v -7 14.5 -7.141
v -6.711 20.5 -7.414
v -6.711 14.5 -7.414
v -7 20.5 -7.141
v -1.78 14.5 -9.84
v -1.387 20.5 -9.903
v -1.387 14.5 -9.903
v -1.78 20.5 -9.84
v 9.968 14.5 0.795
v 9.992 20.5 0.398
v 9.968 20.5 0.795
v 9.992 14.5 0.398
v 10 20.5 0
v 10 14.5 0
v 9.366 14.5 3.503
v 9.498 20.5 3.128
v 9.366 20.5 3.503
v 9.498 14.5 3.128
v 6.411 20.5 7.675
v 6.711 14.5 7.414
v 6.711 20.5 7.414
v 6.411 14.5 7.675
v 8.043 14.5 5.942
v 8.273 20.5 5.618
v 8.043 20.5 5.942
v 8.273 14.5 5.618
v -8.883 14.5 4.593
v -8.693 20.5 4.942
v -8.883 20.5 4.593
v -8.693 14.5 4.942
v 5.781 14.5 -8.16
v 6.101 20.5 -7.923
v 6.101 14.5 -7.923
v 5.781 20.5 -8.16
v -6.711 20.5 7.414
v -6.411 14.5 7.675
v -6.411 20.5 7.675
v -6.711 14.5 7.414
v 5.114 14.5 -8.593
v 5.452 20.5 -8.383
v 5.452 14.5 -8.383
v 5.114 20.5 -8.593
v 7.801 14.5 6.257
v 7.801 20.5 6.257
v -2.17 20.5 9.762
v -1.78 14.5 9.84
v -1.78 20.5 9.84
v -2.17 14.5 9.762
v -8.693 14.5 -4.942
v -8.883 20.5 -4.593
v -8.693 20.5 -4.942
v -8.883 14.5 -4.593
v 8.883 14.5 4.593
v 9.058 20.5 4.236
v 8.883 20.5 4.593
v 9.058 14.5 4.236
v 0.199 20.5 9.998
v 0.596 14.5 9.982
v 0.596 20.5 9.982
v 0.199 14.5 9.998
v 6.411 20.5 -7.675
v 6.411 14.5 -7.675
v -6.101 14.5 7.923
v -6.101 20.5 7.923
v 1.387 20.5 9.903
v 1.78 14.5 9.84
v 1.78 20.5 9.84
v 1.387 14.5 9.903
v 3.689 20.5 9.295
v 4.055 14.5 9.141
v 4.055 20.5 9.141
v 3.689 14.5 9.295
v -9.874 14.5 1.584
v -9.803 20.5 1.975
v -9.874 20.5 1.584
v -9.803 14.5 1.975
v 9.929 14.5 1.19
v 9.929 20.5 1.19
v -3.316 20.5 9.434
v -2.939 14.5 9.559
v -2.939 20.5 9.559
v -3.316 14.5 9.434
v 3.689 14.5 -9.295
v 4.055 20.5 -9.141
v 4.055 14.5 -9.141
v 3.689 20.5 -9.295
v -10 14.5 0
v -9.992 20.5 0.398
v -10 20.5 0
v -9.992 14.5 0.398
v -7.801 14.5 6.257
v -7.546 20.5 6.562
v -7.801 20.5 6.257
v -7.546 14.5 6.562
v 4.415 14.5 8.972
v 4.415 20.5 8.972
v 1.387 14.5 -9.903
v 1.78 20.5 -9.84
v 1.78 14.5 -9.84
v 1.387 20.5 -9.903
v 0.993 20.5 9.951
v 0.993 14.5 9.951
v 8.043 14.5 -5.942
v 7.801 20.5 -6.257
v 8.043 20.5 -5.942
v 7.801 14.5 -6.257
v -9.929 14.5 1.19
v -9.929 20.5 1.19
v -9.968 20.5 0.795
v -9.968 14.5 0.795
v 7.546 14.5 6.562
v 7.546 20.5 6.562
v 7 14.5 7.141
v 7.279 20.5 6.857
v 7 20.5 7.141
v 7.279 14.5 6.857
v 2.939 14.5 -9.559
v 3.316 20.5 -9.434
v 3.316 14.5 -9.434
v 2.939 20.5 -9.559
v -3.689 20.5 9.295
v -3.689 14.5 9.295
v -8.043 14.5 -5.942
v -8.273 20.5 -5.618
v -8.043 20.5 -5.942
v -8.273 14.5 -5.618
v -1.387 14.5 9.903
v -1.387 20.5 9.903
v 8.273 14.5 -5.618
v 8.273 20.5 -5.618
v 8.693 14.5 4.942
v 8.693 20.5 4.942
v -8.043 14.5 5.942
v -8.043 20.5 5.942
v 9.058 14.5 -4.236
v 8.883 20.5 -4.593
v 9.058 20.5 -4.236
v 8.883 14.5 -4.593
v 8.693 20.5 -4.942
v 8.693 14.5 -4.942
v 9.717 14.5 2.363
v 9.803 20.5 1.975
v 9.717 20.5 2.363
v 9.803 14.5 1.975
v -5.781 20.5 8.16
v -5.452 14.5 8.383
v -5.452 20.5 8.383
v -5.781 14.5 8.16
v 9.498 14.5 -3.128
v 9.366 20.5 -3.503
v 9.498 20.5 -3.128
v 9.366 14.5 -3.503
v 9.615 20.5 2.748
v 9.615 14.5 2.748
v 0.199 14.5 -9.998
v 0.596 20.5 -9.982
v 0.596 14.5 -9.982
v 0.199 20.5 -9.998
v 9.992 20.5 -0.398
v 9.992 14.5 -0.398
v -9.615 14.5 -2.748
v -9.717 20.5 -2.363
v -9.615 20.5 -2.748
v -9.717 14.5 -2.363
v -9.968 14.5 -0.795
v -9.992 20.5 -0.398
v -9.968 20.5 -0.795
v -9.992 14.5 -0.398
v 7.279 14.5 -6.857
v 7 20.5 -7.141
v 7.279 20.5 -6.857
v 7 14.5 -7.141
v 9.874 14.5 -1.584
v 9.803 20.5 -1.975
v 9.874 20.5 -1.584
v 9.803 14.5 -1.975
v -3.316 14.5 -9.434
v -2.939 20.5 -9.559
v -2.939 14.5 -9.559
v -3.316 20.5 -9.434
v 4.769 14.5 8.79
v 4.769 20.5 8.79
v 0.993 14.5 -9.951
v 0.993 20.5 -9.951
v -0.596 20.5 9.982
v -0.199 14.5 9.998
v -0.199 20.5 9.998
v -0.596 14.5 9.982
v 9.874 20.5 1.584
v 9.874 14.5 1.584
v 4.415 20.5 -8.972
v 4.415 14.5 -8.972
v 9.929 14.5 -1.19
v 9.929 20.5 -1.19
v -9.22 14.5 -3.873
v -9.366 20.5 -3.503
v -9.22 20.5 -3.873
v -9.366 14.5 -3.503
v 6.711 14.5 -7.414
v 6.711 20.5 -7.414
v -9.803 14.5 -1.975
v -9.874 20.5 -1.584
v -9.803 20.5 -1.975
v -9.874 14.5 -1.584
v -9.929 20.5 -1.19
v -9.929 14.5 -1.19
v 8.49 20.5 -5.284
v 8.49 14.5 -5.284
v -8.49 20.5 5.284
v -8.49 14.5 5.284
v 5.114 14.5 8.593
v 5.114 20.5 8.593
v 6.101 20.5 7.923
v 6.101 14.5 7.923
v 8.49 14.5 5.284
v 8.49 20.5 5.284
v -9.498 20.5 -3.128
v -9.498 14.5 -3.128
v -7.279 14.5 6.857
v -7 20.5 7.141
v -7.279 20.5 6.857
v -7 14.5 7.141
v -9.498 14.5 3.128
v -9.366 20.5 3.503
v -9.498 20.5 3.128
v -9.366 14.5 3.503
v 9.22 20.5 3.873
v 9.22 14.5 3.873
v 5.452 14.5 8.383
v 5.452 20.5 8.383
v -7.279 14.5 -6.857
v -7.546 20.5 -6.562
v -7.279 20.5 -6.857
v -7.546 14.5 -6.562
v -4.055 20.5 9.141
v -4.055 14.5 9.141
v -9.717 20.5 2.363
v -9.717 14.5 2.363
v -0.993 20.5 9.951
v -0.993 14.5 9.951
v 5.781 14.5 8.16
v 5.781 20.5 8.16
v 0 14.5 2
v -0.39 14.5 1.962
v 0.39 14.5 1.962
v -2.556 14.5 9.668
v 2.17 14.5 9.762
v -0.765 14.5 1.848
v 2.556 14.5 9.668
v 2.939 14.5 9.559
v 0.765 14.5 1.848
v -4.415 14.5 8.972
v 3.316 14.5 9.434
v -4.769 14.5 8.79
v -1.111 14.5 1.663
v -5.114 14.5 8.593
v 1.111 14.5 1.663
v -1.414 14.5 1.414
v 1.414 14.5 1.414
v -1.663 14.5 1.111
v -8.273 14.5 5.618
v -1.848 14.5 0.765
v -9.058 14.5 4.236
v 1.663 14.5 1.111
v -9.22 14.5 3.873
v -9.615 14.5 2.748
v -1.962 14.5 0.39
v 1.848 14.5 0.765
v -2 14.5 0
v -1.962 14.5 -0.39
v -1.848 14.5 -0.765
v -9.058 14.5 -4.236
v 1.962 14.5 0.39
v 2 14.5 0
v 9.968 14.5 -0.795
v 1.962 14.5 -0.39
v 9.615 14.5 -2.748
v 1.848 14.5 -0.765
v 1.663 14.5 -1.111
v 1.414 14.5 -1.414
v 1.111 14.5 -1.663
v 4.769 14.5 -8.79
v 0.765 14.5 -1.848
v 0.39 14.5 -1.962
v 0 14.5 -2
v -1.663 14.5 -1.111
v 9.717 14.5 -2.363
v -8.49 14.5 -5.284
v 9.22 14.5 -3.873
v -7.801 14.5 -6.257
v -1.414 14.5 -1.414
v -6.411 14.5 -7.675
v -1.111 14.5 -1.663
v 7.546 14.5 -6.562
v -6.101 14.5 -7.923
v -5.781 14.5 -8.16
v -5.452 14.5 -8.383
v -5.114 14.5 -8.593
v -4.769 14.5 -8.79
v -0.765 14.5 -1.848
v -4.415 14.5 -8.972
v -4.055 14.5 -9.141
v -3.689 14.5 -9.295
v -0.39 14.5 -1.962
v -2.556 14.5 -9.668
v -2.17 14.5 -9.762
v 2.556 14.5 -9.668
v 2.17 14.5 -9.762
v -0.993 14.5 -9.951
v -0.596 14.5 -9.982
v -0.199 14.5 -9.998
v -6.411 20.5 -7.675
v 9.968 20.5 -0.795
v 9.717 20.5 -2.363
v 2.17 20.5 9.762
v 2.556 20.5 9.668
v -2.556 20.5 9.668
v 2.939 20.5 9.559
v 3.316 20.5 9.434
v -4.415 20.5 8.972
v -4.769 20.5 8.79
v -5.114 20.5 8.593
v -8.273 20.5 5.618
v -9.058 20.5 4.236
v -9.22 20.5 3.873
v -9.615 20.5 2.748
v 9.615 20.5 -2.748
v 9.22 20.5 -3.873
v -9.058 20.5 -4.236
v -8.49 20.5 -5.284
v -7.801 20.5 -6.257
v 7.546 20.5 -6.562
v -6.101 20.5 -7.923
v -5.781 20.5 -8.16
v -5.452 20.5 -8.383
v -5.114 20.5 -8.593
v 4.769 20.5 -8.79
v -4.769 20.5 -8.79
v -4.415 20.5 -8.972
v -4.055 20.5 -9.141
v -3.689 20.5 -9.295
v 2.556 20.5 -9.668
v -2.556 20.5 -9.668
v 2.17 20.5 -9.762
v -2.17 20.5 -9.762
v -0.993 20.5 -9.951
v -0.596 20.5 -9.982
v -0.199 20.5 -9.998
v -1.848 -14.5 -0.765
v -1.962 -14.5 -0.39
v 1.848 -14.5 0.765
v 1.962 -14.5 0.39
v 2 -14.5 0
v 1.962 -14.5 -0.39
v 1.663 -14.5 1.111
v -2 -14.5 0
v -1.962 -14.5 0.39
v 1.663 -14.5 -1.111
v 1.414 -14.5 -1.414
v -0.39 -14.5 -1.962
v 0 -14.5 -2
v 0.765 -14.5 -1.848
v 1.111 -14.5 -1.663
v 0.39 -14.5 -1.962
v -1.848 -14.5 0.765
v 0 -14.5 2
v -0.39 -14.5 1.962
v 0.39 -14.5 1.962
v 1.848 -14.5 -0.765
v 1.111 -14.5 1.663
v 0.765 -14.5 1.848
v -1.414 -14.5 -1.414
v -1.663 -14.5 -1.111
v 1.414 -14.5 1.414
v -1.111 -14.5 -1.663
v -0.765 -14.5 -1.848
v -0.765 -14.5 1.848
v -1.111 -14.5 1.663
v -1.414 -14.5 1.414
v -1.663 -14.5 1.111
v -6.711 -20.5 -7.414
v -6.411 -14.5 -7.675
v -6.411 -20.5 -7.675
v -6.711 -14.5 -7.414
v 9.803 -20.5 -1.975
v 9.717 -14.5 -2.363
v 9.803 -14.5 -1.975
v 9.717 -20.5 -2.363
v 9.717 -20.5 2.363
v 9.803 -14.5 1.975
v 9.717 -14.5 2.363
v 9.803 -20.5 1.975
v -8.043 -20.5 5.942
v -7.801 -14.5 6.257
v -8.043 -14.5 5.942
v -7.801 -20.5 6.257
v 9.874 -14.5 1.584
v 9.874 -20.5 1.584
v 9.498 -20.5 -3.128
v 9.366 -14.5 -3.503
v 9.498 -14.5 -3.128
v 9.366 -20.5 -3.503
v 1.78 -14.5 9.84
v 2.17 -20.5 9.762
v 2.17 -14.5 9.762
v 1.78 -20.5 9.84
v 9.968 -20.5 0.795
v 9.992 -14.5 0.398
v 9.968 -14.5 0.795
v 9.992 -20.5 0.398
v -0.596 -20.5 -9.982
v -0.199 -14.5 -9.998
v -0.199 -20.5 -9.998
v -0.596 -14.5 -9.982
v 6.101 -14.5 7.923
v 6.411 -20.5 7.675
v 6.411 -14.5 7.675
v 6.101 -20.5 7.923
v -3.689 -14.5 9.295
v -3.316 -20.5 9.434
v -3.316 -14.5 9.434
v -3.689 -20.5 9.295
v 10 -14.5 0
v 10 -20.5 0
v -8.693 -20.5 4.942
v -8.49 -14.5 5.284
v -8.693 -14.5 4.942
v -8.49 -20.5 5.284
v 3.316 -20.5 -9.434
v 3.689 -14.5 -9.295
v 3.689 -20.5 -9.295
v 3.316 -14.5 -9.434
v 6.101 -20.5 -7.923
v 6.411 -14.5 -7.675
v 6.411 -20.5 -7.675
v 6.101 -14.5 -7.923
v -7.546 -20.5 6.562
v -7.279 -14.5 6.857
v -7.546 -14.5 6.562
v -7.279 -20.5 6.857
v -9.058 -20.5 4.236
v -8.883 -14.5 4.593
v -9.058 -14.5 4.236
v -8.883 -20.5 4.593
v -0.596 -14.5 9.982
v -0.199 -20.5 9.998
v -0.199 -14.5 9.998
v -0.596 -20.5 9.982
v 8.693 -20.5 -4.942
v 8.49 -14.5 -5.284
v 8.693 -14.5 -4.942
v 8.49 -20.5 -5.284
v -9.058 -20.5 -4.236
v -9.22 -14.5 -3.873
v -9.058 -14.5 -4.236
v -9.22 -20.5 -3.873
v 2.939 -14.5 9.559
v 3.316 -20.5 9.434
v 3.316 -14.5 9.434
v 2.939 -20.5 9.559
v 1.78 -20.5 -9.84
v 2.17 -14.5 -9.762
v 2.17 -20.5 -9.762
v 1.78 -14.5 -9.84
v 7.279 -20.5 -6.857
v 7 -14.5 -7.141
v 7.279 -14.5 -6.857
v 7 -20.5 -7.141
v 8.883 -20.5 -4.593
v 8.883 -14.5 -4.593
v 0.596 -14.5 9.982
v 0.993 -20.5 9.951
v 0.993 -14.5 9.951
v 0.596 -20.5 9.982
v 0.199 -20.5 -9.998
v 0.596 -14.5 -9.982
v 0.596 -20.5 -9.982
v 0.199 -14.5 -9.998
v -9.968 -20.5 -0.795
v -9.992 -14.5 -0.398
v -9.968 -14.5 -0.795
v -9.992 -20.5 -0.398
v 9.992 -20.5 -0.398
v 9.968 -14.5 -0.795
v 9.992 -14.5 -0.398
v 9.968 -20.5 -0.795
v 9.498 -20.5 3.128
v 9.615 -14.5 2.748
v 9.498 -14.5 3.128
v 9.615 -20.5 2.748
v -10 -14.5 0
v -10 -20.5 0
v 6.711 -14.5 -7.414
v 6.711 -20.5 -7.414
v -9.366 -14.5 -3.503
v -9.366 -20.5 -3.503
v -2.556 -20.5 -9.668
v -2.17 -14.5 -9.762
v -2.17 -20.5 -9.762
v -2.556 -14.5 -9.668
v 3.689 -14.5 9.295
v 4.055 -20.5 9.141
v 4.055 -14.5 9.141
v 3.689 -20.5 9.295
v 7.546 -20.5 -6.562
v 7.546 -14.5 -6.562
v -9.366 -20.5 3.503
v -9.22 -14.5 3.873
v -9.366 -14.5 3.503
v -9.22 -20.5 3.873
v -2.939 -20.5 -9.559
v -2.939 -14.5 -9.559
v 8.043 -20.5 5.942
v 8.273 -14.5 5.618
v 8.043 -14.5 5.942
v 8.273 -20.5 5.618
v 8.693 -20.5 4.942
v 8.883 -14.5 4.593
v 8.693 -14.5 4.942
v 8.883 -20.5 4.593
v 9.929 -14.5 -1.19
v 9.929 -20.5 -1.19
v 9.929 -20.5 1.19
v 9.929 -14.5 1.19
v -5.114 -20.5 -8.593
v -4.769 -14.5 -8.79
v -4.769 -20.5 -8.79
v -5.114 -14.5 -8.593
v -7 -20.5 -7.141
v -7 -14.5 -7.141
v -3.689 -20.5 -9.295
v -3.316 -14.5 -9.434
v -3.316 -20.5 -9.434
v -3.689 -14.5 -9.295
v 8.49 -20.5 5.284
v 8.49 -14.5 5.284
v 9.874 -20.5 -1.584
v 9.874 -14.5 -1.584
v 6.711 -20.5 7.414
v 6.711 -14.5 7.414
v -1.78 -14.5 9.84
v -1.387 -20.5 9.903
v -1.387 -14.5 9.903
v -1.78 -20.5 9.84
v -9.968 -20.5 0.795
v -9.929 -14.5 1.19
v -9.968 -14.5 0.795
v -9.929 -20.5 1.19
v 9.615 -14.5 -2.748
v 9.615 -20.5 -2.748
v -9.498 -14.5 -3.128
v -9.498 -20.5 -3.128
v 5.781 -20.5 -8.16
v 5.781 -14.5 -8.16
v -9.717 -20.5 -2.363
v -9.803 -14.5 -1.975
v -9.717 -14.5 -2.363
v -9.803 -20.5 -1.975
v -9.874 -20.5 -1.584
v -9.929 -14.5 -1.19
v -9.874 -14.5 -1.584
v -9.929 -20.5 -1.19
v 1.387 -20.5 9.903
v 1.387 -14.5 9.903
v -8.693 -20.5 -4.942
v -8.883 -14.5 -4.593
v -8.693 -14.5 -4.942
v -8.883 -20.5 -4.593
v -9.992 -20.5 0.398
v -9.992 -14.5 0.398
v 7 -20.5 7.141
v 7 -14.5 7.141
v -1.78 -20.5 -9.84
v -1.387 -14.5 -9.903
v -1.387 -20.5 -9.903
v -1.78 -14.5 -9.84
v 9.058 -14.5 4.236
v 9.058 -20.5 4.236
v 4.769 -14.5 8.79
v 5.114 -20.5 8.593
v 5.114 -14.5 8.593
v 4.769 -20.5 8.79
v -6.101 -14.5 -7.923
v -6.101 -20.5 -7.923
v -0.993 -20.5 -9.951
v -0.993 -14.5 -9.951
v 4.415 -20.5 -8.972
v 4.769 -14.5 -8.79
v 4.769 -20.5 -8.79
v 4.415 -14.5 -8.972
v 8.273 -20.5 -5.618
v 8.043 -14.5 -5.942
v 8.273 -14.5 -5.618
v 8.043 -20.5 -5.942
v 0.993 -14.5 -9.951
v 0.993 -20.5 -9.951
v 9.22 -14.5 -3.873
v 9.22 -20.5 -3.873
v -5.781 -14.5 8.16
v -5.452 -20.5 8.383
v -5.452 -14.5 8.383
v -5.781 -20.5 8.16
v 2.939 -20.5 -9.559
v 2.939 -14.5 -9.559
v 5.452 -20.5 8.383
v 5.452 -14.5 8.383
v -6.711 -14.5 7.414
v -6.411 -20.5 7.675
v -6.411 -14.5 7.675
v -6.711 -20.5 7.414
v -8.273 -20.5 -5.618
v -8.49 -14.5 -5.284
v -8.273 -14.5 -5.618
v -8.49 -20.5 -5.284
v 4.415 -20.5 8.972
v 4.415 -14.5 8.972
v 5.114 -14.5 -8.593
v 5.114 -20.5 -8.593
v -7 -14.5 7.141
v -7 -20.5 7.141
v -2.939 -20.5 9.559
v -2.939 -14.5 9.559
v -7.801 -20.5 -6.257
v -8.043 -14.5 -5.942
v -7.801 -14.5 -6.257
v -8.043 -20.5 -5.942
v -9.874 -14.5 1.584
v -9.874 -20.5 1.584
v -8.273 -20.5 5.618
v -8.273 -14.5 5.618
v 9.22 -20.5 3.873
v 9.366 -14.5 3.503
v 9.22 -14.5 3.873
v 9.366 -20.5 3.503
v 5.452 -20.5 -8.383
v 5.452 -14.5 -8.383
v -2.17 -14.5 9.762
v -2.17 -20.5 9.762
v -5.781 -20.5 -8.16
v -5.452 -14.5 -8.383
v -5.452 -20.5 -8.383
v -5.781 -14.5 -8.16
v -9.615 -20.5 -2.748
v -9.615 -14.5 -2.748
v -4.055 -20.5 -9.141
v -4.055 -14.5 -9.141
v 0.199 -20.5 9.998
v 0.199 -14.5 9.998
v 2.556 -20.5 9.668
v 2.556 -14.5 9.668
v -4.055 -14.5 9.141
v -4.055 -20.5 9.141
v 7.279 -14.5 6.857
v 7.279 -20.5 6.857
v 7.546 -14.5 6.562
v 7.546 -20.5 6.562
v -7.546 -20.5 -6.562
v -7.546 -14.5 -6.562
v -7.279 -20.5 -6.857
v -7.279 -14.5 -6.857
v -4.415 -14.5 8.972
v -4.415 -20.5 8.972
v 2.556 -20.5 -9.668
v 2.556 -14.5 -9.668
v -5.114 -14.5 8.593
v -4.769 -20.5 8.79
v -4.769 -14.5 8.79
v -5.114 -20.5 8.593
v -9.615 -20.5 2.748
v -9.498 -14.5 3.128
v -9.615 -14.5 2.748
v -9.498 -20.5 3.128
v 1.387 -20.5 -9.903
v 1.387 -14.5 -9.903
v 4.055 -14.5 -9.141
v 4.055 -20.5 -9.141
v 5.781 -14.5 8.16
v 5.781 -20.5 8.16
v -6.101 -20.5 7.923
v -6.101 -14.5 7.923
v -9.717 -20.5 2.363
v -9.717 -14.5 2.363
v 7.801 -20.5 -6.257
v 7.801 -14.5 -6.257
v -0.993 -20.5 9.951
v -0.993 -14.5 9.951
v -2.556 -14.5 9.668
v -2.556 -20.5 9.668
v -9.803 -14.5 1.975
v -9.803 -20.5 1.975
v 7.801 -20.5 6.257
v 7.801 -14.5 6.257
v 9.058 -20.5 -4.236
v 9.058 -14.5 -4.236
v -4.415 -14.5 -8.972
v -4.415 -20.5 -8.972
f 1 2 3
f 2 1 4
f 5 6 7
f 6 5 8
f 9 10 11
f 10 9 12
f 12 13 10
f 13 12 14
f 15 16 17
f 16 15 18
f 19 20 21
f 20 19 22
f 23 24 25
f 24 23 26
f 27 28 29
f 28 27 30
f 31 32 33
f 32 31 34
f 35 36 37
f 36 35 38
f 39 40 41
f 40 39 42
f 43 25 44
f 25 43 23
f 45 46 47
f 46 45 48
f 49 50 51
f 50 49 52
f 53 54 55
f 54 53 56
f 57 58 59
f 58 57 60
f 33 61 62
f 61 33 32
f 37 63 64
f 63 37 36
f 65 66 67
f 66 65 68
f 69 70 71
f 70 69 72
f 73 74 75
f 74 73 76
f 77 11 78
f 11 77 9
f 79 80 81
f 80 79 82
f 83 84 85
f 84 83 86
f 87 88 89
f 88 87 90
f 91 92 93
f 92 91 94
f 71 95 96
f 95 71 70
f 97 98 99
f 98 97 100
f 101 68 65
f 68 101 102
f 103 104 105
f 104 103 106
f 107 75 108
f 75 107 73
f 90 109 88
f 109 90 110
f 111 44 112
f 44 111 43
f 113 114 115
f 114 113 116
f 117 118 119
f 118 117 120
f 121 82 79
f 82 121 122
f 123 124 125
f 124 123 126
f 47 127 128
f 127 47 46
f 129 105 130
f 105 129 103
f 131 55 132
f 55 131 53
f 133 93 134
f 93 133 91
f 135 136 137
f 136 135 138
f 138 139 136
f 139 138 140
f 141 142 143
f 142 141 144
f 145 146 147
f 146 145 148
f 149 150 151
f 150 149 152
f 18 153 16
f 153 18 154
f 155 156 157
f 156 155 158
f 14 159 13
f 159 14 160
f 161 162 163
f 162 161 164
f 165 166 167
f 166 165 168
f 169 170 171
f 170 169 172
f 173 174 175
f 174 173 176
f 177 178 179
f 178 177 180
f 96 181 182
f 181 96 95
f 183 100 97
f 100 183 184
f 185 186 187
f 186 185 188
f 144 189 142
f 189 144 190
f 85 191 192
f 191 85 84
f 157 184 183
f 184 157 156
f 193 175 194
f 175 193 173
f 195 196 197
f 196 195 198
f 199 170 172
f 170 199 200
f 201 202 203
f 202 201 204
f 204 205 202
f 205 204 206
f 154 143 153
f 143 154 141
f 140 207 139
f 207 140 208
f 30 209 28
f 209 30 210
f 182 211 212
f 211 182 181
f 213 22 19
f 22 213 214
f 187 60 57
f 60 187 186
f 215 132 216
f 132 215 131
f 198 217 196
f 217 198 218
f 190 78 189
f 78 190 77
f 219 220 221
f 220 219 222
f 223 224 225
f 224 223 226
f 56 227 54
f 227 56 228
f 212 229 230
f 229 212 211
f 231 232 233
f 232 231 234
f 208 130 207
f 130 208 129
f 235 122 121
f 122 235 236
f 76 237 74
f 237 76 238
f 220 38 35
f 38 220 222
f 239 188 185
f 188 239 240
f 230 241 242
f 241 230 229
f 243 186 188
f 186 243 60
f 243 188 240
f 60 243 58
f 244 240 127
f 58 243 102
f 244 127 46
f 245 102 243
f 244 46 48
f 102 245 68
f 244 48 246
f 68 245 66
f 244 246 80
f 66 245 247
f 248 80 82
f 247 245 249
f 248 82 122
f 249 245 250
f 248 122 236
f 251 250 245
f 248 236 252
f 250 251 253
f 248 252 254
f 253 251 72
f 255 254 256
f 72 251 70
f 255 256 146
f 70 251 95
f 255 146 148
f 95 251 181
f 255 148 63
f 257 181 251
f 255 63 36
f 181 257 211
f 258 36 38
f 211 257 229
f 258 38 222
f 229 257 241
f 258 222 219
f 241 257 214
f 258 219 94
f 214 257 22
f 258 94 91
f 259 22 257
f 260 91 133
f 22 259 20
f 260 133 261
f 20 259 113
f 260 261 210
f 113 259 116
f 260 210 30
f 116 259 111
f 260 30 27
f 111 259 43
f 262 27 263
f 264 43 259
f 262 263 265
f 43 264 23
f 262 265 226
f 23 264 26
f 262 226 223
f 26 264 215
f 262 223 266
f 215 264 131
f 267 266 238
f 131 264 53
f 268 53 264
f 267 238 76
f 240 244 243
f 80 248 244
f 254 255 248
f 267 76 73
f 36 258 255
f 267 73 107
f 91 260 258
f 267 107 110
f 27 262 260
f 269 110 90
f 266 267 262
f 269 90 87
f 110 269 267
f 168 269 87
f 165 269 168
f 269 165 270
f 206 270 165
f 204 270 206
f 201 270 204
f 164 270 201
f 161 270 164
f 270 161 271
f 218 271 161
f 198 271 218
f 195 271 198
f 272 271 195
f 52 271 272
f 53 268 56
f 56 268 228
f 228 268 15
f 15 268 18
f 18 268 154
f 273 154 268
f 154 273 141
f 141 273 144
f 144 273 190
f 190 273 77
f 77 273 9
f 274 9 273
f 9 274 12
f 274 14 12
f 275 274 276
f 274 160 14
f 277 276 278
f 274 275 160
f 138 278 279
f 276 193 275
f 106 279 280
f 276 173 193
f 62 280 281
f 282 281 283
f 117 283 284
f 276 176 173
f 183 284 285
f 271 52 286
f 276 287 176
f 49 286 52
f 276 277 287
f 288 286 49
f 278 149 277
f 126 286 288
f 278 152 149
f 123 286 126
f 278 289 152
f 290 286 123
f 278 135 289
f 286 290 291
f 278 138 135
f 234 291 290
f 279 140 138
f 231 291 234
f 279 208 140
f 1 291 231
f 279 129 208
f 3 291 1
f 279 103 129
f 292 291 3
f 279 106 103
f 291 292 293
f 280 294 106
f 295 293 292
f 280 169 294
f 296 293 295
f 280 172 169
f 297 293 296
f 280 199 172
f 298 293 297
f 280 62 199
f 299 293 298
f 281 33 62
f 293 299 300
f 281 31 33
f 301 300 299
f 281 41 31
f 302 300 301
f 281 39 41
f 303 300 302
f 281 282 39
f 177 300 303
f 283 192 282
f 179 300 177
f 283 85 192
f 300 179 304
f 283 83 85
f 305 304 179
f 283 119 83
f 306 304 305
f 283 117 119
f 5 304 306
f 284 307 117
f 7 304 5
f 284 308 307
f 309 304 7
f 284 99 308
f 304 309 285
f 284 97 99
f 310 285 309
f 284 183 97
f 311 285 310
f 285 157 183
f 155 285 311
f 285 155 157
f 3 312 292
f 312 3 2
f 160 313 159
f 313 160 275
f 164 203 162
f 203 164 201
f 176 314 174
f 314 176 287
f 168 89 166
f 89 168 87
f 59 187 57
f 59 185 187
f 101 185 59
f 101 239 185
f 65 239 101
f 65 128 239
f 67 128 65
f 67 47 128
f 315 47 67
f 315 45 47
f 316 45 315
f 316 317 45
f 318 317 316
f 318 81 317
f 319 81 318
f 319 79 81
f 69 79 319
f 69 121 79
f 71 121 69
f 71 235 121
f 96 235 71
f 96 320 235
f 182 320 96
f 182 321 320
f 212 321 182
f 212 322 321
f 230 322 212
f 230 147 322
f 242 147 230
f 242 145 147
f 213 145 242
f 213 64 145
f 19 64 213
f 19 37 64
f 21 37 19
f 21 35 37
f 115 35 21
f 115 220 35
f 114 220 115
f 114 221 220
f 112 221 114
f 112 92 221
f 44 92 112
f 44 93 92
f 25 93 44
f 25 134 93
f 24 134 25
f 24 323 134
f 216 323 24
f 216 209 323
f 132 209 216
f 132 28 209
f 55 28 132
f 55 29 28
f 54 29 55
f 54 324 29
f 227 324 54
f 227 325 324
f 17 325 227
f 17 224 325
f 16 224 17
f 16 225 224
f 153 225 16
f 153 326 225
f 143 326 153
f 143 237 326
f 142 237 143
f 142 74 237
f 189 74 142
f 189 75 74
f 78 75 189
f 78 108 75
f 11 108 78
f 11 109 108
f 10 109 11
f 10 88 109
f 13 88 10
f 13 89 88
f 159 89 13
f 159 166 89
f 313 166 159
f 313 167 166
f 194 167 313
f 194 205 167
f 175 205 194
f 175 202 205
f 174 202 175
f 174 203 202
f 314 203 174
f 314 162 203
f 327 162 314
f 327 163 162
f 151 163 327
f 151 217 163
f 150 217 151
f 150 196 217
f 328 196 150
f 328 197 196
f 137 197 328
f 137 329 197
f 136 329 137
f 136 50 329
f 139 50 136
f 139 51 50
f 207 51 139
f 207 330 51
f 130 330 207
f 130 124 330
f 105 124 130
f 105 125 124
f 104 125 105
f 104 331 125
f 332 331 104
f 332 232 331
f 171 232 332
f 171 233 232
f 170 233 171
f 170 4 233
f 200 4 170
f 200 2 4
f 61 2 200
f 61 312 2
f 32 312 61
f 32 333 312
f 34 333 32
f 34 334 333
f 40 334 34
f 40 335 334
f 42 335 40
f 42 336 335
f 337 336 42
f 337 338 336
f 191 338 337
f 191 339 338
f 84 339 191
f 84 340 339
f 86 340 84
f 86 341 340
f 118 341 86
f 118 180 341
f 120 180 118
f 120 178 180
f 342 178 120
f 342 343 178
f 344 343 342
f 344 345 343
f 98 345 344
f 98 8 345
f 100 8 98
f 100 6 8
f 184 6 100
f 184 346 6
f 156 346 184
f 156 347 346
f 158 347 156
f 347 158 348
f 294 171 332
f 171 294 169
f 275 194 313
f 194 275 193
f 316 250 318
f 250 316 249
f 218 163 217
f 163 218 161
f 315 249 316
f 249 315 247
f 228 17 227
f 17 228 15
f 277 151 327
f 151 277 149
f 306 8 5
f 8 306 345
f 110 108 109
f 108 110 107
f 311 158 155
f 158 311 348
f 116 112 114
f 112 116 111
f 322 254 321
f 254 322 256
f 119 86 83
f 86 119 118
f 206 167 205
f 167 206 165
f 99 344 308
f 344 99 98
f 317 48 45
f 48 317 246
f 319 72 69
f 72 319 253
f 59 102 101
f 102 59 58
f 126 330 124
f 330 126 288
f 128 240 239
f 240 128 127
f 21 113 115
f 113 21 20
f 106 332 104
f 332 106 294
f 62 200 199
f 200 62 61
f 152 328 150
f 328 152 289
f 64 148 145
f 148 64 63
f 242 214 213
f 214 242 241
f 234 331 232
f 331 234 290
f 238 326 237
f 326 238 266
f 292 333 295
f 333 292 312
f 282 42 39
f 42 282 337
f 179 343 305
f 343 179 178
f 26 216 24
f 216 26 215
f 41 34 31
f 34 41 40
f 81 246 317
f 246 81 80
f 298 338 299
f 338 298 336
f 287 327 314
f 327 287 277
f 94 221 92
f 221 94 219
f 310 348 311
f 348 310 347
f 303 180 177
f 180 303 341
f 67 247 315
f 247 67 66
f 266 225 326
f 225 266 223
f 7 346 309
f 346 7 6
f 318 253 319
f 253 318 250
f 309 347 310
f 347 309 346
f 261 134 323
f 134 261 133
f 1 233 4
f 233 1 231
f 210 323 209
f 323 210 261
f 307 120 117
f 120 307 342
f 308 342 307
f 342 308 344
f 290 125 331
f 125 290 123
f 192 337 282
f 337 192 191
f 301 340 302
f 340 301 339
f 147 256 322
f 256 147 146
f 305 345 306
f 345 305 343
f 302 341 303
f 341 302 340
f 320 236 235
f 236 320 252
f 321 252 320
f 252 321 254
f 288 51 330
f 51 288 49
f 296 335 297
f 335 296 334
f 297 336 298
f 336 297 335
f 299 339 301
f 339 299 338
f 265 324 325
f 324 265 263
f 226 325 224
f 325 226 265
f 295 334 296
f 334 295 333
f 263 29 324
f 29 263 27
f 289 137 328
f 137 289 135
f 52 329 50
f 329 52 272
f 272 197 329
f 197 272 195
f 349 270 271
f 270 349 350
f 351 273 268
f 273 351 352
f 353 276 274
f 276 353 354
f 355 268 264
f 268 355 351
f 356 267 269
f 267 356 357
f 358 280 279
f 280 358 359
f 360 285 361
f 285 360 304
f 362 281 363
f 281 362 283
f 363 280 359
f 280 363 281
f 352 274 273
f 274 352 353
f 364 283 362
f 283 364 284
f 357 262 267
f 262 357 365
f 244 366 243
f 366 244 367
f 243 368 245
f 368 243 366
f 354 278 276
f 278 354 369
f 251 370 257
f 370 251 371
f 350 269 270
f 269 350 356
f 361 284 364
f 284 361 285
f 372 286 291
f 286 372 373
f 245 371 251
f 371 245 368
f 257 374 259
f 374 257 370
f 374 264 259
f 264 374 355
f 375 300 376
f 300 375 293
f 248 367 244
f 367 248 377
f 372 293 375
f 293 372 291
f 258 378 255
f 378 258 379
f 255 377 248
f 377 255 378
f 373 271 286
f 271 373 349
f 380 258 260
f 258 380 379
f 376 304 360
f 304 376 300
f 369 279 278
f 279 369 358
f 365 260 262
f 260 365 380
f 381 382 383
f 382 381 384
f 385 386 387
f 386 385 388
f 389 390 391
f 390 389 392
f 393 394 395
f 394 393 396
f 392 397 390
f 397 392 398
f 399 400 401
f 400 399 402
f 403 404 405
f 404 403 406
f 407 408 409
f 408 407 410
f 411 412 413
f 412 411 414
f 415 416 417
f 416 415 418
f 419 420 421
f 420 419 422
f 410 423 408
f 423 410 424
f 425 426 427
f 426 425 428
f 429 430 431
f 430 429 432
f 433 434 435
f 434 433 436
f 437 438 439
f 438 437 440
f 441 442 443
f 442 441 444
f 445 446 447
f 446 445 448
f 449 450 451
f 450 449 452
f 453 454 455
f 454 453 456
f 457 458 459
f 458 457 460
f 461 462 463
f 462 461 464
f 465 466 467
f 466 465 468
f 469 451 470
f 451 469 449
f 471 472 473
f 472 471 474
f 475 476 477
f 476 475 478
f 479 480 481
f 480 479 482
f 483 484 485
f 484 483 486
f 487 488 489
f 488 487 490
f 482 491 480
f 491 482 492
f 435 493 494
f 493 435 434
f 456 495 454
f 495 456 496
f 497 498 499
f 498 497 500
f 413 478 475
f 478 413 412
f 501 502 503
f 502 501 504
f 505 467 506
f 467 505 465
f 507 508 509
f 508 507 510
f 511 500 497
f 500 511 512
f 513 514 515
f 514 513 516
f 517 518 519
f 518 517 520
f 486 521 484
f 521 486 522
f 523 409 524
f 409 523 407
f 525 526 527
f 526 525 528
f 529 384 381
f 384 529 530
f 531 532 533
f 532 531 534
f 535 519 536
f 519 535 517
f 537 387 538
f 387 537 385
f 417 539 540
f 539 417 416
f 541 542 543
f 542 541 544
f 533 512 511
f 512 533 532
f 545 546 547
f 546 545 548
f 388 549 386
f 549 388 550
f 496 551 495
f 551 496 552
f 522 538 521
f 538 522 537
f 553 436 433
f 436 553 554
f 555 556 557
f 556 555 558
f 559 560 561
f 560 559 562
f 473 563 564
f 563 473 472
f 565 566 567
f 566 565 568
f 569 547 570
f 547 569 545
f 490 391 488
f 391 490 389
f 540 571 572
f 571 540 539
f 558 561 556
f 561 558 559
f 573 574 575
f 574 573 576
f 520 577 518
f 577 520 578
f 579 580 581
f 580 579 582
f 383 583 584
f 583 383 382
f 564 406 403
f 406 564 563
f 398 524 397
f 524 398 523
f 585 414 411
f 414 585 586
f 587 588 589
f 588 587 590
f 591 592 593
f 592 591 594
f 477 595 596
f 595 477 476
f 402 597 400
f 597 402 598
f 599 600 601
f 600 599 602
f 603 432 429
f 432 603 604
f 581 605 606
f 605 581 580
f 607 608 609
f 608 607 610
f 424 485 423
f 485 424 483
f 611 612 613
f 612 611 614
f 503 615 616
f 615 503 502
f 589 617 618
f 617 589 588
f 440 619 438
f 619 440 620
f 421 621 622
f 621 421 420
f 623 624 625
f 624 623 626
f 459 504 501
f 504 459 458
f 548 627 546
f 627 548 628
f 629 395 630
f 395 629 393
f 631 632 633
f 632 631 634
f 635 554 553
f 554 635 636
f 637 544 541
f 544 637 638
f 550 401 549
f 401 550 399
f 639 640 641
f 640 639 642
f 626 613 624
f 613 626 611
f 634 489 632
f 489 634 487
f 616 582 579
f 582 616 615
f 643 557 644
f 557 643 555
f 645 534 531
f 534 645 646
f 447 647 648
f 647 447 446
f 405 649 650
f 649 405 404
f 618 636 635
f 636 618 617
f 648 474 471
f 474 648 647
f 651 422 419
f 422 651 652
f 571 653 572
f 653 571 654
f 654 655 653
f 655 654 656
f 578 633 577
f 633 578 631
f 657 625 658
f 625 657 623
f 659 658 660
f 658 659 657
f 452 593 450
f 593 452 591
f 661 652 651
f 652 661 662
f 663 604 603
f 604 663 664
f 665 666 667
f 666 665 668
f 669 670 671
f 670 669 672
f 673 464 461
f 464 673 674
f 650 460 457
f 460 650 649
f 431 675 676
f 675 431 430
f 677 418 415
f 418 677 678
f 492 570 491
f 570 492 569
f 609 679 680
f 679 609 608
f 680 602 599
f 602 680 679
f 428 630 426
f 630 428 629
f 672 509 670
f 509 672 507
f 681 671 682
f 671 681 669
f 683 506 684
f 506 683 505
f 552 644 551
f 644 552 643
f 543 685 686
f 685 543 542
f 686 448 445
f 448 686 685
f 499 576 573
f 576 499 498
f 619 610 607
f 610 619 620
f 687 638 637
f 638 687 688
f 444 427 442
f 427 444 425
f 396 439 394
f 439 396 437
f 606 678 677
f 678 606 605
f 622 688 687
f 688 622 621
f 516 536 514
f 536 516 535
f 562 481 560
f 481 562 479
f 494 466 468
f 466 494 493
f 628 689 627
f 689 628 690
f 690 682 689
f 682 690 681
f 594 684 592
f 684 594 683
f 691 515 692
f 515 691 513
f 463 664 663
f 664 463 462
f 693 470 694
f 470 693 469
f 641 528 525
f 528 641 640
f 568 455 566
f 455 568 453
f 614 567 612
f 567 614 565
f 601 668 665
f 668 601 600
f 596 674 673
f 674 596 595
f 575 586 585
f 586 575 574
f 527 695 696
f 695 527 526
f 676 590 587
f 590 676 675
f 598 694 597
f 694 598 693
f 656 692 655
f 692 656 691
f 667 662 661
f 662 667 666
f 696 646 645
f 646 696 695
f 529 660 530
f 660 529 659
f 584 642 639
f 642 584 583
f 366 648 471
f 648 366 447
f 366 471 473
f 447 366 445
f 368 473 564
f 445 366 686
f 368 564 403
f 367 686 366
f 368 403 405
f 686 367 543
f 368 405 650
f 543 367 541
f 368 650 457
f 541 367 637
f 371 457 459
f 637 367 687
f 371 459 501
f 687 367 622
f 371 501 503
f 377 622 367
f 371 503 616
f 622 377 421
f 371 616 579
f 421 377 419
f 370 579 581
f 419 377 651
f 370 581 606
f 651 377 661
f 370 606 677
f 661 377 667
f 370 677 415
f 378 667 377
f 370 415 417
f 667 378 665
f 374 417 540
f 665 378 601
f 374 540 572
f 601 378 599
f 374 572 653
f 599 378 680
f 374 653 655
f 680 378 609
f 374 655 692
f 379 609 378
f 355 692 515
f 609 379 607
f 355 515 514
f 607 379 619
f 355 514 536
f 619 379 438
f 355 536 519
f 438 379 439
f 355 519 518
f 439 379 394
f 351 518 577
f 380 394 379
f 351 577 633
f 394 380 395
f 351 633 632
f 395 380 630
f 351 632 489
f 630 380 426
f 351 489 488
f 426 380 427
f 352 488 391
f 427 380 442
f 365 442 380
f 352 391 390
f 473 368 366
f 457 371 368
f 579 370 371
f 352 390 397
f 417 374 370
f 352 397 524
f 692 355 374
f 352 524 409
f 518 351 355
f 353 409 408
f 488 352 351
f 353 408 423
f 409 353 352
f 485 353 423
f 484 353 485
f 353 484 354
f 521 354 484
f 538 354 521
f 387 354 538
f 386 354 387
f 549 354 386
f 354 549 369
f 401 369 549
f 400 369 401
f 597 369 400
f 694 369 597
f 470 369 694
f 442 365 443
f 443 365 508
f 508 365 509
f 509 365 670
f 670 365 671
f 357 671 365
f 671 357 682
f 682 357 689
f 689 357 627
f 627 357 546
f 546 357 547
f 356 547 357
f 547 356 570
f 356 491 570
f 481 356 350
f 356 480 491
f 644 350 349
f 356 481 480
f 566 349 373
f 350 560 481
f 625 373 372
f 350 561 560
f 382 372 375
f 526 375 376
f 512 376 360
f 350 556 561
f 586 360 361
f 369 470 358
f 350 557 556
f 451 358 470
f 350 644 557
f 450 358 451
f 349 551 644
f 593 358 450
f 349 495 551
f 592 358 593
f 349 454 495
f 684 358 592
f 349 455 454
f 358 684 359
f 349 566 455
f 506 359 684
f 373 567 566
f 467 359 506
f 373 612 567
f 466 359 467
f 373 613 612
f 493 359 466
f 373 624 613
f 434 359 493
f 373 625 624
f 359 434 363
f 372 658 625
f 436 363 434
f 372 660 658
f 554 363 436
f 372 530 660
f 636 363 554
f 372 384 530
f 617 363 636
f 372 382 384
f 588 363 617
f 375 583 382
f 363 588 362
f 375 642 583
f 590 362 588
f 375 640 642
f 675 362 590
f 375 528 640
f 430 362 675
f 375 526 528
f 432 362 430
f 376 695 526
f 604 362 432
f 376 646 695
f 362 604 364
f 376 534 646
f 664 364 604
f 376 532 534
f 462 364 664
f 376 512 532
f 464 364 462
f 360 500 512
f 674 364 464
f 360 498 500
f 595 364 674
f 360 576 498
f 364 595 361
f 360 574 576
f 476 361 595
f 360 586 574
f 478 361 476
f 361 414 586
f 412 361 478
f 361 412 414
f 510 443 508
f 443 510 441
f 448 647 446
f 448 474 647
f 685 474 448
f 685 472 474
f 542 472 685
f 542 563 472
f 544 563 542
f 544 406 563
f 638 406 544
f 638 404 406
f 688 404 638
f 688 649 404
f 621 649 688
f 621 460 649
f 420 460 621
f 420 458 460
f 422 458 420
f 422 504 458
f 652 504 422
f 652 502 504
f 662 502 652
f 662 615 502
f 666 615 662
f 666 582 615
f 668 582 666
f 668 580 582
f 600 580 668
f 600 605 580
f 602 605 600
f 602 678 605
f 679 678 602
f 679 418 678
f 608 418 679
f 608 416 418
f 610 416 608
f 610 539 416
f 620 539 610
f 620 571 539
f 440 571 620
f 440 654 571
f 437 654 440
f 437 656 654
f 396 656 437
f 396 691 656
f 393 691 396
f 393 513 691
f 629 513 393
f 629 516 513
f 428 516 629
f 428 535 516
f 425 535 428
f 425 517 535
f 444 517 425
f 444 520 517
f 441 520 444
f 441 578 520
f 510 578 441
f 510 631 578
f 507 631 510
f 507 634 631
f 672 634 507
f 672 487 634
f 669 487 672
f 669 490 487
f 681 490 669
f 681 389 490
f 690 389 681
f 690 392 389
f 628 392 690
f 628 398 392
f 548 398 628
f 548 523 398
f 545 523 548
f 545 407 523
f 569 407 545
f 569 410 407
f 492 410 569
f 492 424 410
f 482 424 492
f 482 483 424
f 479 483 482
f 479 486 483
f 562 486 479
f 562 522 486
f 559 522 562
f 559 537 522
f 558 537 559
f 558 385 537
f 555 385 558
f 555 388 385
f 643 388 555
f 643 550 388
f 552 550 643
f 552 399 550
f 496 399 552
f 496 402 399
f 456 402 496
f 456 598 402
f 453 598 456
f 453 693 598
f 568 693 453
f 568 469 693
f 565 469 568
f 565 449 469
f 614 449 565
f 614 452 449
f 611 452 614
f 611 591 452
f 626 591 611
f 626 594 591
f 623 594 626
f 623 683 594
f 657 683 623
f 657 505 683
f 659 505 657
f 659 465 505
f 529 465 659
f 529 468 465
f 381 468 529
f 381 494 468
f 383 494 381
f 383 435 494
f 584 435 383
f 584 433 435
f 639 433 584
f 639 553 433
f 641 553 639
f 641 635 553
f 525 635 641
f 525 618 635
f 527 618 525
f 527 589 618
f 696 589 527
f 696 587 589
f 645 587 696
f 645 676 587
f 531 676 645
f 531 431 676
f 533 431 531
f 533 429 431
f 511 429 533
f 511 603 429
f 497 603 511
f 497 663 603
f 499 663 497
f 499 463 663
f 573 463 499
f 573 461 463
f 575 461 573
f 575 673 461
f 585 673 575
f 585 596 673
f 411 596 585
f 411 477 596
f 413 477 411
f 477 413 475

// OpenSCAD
// file: vehicle_parts.scad
module simple_wheel(wheel_radius=10, wheel_width=6) {
    rotate([90,0,0])
        cylinder(h=wheel_width,r=wheel_radius,center=true);
}

module complex_wheel(wheel_radius=10, side_spheres_radius=50, hub_thickness=4, cylinder_radius=2) {
    cylinder_height=2*wheel_radius;  
    difference() {  
        // Wheel sphere  
        sphere(r=wheel_radius);  
        // Side sphere 1  
        translate([0,side_spheres_radius + hub_thickness/2,0])
            sphere(r=side_spheres_radius);  
        // Side sphere 2  
        translate([0,- (side_spheres_radius + hub_thickness/2),0])
            sphere(r=side_spheres_radius);  
        // Cylinder 1  
        translate([wheel_radius/2,0,0])
            rotate([90,0,0])
            cylinder(h=cylinder_height,r=cylinder_radius,center=true);  
        // Cylinder 2  
        translate([0,0,wheel_radius/2])
            rotate([90,0,0])
            cylinder(h=cylinder_height,r=cylinder_radius,center=true);  
        // Cylinder 3  
        translate([-wheel_radius/2,0,0])
            rotate([90,0,0])
            cylinder(h=cylinder_height,r=cylinder_radius,center=true);  
        // Cylinder 4  
        translate([0,0,-wheel_radius/2])
            rotate([90,0,0])
            cylinder(h=cylinder_height,r=cylinder_radius,center=true);  
    }
}

module body(base_height=10, top_height=14, base_length=60, top_length=30, width=20, top_offset=5) {
    // Car body base
    cube([base_length,width,base_height],center=true);
    // Car body top
    translate([top_offset,0,base_height/2+top_height/2 - 0.001])
        cube([top_length,width,top_height],center=true);
}

module axle(track=35, radius=2) {
    rotate([90,0,0])
        cylinder(h=track,r=2,center=true);
}
// main file
use <vehicle_parts.scad>
$fa = 1;
$fs = 0.4;
module axle_wheelset(track=35, radius=2) {
    translate([0,track/2,0])
        children(0);
    axle(track=track, radius=radius);
    translate([0,-track/2,0])
        children(0);
}
axle_wheelset() {
    simple_wheel();
}
